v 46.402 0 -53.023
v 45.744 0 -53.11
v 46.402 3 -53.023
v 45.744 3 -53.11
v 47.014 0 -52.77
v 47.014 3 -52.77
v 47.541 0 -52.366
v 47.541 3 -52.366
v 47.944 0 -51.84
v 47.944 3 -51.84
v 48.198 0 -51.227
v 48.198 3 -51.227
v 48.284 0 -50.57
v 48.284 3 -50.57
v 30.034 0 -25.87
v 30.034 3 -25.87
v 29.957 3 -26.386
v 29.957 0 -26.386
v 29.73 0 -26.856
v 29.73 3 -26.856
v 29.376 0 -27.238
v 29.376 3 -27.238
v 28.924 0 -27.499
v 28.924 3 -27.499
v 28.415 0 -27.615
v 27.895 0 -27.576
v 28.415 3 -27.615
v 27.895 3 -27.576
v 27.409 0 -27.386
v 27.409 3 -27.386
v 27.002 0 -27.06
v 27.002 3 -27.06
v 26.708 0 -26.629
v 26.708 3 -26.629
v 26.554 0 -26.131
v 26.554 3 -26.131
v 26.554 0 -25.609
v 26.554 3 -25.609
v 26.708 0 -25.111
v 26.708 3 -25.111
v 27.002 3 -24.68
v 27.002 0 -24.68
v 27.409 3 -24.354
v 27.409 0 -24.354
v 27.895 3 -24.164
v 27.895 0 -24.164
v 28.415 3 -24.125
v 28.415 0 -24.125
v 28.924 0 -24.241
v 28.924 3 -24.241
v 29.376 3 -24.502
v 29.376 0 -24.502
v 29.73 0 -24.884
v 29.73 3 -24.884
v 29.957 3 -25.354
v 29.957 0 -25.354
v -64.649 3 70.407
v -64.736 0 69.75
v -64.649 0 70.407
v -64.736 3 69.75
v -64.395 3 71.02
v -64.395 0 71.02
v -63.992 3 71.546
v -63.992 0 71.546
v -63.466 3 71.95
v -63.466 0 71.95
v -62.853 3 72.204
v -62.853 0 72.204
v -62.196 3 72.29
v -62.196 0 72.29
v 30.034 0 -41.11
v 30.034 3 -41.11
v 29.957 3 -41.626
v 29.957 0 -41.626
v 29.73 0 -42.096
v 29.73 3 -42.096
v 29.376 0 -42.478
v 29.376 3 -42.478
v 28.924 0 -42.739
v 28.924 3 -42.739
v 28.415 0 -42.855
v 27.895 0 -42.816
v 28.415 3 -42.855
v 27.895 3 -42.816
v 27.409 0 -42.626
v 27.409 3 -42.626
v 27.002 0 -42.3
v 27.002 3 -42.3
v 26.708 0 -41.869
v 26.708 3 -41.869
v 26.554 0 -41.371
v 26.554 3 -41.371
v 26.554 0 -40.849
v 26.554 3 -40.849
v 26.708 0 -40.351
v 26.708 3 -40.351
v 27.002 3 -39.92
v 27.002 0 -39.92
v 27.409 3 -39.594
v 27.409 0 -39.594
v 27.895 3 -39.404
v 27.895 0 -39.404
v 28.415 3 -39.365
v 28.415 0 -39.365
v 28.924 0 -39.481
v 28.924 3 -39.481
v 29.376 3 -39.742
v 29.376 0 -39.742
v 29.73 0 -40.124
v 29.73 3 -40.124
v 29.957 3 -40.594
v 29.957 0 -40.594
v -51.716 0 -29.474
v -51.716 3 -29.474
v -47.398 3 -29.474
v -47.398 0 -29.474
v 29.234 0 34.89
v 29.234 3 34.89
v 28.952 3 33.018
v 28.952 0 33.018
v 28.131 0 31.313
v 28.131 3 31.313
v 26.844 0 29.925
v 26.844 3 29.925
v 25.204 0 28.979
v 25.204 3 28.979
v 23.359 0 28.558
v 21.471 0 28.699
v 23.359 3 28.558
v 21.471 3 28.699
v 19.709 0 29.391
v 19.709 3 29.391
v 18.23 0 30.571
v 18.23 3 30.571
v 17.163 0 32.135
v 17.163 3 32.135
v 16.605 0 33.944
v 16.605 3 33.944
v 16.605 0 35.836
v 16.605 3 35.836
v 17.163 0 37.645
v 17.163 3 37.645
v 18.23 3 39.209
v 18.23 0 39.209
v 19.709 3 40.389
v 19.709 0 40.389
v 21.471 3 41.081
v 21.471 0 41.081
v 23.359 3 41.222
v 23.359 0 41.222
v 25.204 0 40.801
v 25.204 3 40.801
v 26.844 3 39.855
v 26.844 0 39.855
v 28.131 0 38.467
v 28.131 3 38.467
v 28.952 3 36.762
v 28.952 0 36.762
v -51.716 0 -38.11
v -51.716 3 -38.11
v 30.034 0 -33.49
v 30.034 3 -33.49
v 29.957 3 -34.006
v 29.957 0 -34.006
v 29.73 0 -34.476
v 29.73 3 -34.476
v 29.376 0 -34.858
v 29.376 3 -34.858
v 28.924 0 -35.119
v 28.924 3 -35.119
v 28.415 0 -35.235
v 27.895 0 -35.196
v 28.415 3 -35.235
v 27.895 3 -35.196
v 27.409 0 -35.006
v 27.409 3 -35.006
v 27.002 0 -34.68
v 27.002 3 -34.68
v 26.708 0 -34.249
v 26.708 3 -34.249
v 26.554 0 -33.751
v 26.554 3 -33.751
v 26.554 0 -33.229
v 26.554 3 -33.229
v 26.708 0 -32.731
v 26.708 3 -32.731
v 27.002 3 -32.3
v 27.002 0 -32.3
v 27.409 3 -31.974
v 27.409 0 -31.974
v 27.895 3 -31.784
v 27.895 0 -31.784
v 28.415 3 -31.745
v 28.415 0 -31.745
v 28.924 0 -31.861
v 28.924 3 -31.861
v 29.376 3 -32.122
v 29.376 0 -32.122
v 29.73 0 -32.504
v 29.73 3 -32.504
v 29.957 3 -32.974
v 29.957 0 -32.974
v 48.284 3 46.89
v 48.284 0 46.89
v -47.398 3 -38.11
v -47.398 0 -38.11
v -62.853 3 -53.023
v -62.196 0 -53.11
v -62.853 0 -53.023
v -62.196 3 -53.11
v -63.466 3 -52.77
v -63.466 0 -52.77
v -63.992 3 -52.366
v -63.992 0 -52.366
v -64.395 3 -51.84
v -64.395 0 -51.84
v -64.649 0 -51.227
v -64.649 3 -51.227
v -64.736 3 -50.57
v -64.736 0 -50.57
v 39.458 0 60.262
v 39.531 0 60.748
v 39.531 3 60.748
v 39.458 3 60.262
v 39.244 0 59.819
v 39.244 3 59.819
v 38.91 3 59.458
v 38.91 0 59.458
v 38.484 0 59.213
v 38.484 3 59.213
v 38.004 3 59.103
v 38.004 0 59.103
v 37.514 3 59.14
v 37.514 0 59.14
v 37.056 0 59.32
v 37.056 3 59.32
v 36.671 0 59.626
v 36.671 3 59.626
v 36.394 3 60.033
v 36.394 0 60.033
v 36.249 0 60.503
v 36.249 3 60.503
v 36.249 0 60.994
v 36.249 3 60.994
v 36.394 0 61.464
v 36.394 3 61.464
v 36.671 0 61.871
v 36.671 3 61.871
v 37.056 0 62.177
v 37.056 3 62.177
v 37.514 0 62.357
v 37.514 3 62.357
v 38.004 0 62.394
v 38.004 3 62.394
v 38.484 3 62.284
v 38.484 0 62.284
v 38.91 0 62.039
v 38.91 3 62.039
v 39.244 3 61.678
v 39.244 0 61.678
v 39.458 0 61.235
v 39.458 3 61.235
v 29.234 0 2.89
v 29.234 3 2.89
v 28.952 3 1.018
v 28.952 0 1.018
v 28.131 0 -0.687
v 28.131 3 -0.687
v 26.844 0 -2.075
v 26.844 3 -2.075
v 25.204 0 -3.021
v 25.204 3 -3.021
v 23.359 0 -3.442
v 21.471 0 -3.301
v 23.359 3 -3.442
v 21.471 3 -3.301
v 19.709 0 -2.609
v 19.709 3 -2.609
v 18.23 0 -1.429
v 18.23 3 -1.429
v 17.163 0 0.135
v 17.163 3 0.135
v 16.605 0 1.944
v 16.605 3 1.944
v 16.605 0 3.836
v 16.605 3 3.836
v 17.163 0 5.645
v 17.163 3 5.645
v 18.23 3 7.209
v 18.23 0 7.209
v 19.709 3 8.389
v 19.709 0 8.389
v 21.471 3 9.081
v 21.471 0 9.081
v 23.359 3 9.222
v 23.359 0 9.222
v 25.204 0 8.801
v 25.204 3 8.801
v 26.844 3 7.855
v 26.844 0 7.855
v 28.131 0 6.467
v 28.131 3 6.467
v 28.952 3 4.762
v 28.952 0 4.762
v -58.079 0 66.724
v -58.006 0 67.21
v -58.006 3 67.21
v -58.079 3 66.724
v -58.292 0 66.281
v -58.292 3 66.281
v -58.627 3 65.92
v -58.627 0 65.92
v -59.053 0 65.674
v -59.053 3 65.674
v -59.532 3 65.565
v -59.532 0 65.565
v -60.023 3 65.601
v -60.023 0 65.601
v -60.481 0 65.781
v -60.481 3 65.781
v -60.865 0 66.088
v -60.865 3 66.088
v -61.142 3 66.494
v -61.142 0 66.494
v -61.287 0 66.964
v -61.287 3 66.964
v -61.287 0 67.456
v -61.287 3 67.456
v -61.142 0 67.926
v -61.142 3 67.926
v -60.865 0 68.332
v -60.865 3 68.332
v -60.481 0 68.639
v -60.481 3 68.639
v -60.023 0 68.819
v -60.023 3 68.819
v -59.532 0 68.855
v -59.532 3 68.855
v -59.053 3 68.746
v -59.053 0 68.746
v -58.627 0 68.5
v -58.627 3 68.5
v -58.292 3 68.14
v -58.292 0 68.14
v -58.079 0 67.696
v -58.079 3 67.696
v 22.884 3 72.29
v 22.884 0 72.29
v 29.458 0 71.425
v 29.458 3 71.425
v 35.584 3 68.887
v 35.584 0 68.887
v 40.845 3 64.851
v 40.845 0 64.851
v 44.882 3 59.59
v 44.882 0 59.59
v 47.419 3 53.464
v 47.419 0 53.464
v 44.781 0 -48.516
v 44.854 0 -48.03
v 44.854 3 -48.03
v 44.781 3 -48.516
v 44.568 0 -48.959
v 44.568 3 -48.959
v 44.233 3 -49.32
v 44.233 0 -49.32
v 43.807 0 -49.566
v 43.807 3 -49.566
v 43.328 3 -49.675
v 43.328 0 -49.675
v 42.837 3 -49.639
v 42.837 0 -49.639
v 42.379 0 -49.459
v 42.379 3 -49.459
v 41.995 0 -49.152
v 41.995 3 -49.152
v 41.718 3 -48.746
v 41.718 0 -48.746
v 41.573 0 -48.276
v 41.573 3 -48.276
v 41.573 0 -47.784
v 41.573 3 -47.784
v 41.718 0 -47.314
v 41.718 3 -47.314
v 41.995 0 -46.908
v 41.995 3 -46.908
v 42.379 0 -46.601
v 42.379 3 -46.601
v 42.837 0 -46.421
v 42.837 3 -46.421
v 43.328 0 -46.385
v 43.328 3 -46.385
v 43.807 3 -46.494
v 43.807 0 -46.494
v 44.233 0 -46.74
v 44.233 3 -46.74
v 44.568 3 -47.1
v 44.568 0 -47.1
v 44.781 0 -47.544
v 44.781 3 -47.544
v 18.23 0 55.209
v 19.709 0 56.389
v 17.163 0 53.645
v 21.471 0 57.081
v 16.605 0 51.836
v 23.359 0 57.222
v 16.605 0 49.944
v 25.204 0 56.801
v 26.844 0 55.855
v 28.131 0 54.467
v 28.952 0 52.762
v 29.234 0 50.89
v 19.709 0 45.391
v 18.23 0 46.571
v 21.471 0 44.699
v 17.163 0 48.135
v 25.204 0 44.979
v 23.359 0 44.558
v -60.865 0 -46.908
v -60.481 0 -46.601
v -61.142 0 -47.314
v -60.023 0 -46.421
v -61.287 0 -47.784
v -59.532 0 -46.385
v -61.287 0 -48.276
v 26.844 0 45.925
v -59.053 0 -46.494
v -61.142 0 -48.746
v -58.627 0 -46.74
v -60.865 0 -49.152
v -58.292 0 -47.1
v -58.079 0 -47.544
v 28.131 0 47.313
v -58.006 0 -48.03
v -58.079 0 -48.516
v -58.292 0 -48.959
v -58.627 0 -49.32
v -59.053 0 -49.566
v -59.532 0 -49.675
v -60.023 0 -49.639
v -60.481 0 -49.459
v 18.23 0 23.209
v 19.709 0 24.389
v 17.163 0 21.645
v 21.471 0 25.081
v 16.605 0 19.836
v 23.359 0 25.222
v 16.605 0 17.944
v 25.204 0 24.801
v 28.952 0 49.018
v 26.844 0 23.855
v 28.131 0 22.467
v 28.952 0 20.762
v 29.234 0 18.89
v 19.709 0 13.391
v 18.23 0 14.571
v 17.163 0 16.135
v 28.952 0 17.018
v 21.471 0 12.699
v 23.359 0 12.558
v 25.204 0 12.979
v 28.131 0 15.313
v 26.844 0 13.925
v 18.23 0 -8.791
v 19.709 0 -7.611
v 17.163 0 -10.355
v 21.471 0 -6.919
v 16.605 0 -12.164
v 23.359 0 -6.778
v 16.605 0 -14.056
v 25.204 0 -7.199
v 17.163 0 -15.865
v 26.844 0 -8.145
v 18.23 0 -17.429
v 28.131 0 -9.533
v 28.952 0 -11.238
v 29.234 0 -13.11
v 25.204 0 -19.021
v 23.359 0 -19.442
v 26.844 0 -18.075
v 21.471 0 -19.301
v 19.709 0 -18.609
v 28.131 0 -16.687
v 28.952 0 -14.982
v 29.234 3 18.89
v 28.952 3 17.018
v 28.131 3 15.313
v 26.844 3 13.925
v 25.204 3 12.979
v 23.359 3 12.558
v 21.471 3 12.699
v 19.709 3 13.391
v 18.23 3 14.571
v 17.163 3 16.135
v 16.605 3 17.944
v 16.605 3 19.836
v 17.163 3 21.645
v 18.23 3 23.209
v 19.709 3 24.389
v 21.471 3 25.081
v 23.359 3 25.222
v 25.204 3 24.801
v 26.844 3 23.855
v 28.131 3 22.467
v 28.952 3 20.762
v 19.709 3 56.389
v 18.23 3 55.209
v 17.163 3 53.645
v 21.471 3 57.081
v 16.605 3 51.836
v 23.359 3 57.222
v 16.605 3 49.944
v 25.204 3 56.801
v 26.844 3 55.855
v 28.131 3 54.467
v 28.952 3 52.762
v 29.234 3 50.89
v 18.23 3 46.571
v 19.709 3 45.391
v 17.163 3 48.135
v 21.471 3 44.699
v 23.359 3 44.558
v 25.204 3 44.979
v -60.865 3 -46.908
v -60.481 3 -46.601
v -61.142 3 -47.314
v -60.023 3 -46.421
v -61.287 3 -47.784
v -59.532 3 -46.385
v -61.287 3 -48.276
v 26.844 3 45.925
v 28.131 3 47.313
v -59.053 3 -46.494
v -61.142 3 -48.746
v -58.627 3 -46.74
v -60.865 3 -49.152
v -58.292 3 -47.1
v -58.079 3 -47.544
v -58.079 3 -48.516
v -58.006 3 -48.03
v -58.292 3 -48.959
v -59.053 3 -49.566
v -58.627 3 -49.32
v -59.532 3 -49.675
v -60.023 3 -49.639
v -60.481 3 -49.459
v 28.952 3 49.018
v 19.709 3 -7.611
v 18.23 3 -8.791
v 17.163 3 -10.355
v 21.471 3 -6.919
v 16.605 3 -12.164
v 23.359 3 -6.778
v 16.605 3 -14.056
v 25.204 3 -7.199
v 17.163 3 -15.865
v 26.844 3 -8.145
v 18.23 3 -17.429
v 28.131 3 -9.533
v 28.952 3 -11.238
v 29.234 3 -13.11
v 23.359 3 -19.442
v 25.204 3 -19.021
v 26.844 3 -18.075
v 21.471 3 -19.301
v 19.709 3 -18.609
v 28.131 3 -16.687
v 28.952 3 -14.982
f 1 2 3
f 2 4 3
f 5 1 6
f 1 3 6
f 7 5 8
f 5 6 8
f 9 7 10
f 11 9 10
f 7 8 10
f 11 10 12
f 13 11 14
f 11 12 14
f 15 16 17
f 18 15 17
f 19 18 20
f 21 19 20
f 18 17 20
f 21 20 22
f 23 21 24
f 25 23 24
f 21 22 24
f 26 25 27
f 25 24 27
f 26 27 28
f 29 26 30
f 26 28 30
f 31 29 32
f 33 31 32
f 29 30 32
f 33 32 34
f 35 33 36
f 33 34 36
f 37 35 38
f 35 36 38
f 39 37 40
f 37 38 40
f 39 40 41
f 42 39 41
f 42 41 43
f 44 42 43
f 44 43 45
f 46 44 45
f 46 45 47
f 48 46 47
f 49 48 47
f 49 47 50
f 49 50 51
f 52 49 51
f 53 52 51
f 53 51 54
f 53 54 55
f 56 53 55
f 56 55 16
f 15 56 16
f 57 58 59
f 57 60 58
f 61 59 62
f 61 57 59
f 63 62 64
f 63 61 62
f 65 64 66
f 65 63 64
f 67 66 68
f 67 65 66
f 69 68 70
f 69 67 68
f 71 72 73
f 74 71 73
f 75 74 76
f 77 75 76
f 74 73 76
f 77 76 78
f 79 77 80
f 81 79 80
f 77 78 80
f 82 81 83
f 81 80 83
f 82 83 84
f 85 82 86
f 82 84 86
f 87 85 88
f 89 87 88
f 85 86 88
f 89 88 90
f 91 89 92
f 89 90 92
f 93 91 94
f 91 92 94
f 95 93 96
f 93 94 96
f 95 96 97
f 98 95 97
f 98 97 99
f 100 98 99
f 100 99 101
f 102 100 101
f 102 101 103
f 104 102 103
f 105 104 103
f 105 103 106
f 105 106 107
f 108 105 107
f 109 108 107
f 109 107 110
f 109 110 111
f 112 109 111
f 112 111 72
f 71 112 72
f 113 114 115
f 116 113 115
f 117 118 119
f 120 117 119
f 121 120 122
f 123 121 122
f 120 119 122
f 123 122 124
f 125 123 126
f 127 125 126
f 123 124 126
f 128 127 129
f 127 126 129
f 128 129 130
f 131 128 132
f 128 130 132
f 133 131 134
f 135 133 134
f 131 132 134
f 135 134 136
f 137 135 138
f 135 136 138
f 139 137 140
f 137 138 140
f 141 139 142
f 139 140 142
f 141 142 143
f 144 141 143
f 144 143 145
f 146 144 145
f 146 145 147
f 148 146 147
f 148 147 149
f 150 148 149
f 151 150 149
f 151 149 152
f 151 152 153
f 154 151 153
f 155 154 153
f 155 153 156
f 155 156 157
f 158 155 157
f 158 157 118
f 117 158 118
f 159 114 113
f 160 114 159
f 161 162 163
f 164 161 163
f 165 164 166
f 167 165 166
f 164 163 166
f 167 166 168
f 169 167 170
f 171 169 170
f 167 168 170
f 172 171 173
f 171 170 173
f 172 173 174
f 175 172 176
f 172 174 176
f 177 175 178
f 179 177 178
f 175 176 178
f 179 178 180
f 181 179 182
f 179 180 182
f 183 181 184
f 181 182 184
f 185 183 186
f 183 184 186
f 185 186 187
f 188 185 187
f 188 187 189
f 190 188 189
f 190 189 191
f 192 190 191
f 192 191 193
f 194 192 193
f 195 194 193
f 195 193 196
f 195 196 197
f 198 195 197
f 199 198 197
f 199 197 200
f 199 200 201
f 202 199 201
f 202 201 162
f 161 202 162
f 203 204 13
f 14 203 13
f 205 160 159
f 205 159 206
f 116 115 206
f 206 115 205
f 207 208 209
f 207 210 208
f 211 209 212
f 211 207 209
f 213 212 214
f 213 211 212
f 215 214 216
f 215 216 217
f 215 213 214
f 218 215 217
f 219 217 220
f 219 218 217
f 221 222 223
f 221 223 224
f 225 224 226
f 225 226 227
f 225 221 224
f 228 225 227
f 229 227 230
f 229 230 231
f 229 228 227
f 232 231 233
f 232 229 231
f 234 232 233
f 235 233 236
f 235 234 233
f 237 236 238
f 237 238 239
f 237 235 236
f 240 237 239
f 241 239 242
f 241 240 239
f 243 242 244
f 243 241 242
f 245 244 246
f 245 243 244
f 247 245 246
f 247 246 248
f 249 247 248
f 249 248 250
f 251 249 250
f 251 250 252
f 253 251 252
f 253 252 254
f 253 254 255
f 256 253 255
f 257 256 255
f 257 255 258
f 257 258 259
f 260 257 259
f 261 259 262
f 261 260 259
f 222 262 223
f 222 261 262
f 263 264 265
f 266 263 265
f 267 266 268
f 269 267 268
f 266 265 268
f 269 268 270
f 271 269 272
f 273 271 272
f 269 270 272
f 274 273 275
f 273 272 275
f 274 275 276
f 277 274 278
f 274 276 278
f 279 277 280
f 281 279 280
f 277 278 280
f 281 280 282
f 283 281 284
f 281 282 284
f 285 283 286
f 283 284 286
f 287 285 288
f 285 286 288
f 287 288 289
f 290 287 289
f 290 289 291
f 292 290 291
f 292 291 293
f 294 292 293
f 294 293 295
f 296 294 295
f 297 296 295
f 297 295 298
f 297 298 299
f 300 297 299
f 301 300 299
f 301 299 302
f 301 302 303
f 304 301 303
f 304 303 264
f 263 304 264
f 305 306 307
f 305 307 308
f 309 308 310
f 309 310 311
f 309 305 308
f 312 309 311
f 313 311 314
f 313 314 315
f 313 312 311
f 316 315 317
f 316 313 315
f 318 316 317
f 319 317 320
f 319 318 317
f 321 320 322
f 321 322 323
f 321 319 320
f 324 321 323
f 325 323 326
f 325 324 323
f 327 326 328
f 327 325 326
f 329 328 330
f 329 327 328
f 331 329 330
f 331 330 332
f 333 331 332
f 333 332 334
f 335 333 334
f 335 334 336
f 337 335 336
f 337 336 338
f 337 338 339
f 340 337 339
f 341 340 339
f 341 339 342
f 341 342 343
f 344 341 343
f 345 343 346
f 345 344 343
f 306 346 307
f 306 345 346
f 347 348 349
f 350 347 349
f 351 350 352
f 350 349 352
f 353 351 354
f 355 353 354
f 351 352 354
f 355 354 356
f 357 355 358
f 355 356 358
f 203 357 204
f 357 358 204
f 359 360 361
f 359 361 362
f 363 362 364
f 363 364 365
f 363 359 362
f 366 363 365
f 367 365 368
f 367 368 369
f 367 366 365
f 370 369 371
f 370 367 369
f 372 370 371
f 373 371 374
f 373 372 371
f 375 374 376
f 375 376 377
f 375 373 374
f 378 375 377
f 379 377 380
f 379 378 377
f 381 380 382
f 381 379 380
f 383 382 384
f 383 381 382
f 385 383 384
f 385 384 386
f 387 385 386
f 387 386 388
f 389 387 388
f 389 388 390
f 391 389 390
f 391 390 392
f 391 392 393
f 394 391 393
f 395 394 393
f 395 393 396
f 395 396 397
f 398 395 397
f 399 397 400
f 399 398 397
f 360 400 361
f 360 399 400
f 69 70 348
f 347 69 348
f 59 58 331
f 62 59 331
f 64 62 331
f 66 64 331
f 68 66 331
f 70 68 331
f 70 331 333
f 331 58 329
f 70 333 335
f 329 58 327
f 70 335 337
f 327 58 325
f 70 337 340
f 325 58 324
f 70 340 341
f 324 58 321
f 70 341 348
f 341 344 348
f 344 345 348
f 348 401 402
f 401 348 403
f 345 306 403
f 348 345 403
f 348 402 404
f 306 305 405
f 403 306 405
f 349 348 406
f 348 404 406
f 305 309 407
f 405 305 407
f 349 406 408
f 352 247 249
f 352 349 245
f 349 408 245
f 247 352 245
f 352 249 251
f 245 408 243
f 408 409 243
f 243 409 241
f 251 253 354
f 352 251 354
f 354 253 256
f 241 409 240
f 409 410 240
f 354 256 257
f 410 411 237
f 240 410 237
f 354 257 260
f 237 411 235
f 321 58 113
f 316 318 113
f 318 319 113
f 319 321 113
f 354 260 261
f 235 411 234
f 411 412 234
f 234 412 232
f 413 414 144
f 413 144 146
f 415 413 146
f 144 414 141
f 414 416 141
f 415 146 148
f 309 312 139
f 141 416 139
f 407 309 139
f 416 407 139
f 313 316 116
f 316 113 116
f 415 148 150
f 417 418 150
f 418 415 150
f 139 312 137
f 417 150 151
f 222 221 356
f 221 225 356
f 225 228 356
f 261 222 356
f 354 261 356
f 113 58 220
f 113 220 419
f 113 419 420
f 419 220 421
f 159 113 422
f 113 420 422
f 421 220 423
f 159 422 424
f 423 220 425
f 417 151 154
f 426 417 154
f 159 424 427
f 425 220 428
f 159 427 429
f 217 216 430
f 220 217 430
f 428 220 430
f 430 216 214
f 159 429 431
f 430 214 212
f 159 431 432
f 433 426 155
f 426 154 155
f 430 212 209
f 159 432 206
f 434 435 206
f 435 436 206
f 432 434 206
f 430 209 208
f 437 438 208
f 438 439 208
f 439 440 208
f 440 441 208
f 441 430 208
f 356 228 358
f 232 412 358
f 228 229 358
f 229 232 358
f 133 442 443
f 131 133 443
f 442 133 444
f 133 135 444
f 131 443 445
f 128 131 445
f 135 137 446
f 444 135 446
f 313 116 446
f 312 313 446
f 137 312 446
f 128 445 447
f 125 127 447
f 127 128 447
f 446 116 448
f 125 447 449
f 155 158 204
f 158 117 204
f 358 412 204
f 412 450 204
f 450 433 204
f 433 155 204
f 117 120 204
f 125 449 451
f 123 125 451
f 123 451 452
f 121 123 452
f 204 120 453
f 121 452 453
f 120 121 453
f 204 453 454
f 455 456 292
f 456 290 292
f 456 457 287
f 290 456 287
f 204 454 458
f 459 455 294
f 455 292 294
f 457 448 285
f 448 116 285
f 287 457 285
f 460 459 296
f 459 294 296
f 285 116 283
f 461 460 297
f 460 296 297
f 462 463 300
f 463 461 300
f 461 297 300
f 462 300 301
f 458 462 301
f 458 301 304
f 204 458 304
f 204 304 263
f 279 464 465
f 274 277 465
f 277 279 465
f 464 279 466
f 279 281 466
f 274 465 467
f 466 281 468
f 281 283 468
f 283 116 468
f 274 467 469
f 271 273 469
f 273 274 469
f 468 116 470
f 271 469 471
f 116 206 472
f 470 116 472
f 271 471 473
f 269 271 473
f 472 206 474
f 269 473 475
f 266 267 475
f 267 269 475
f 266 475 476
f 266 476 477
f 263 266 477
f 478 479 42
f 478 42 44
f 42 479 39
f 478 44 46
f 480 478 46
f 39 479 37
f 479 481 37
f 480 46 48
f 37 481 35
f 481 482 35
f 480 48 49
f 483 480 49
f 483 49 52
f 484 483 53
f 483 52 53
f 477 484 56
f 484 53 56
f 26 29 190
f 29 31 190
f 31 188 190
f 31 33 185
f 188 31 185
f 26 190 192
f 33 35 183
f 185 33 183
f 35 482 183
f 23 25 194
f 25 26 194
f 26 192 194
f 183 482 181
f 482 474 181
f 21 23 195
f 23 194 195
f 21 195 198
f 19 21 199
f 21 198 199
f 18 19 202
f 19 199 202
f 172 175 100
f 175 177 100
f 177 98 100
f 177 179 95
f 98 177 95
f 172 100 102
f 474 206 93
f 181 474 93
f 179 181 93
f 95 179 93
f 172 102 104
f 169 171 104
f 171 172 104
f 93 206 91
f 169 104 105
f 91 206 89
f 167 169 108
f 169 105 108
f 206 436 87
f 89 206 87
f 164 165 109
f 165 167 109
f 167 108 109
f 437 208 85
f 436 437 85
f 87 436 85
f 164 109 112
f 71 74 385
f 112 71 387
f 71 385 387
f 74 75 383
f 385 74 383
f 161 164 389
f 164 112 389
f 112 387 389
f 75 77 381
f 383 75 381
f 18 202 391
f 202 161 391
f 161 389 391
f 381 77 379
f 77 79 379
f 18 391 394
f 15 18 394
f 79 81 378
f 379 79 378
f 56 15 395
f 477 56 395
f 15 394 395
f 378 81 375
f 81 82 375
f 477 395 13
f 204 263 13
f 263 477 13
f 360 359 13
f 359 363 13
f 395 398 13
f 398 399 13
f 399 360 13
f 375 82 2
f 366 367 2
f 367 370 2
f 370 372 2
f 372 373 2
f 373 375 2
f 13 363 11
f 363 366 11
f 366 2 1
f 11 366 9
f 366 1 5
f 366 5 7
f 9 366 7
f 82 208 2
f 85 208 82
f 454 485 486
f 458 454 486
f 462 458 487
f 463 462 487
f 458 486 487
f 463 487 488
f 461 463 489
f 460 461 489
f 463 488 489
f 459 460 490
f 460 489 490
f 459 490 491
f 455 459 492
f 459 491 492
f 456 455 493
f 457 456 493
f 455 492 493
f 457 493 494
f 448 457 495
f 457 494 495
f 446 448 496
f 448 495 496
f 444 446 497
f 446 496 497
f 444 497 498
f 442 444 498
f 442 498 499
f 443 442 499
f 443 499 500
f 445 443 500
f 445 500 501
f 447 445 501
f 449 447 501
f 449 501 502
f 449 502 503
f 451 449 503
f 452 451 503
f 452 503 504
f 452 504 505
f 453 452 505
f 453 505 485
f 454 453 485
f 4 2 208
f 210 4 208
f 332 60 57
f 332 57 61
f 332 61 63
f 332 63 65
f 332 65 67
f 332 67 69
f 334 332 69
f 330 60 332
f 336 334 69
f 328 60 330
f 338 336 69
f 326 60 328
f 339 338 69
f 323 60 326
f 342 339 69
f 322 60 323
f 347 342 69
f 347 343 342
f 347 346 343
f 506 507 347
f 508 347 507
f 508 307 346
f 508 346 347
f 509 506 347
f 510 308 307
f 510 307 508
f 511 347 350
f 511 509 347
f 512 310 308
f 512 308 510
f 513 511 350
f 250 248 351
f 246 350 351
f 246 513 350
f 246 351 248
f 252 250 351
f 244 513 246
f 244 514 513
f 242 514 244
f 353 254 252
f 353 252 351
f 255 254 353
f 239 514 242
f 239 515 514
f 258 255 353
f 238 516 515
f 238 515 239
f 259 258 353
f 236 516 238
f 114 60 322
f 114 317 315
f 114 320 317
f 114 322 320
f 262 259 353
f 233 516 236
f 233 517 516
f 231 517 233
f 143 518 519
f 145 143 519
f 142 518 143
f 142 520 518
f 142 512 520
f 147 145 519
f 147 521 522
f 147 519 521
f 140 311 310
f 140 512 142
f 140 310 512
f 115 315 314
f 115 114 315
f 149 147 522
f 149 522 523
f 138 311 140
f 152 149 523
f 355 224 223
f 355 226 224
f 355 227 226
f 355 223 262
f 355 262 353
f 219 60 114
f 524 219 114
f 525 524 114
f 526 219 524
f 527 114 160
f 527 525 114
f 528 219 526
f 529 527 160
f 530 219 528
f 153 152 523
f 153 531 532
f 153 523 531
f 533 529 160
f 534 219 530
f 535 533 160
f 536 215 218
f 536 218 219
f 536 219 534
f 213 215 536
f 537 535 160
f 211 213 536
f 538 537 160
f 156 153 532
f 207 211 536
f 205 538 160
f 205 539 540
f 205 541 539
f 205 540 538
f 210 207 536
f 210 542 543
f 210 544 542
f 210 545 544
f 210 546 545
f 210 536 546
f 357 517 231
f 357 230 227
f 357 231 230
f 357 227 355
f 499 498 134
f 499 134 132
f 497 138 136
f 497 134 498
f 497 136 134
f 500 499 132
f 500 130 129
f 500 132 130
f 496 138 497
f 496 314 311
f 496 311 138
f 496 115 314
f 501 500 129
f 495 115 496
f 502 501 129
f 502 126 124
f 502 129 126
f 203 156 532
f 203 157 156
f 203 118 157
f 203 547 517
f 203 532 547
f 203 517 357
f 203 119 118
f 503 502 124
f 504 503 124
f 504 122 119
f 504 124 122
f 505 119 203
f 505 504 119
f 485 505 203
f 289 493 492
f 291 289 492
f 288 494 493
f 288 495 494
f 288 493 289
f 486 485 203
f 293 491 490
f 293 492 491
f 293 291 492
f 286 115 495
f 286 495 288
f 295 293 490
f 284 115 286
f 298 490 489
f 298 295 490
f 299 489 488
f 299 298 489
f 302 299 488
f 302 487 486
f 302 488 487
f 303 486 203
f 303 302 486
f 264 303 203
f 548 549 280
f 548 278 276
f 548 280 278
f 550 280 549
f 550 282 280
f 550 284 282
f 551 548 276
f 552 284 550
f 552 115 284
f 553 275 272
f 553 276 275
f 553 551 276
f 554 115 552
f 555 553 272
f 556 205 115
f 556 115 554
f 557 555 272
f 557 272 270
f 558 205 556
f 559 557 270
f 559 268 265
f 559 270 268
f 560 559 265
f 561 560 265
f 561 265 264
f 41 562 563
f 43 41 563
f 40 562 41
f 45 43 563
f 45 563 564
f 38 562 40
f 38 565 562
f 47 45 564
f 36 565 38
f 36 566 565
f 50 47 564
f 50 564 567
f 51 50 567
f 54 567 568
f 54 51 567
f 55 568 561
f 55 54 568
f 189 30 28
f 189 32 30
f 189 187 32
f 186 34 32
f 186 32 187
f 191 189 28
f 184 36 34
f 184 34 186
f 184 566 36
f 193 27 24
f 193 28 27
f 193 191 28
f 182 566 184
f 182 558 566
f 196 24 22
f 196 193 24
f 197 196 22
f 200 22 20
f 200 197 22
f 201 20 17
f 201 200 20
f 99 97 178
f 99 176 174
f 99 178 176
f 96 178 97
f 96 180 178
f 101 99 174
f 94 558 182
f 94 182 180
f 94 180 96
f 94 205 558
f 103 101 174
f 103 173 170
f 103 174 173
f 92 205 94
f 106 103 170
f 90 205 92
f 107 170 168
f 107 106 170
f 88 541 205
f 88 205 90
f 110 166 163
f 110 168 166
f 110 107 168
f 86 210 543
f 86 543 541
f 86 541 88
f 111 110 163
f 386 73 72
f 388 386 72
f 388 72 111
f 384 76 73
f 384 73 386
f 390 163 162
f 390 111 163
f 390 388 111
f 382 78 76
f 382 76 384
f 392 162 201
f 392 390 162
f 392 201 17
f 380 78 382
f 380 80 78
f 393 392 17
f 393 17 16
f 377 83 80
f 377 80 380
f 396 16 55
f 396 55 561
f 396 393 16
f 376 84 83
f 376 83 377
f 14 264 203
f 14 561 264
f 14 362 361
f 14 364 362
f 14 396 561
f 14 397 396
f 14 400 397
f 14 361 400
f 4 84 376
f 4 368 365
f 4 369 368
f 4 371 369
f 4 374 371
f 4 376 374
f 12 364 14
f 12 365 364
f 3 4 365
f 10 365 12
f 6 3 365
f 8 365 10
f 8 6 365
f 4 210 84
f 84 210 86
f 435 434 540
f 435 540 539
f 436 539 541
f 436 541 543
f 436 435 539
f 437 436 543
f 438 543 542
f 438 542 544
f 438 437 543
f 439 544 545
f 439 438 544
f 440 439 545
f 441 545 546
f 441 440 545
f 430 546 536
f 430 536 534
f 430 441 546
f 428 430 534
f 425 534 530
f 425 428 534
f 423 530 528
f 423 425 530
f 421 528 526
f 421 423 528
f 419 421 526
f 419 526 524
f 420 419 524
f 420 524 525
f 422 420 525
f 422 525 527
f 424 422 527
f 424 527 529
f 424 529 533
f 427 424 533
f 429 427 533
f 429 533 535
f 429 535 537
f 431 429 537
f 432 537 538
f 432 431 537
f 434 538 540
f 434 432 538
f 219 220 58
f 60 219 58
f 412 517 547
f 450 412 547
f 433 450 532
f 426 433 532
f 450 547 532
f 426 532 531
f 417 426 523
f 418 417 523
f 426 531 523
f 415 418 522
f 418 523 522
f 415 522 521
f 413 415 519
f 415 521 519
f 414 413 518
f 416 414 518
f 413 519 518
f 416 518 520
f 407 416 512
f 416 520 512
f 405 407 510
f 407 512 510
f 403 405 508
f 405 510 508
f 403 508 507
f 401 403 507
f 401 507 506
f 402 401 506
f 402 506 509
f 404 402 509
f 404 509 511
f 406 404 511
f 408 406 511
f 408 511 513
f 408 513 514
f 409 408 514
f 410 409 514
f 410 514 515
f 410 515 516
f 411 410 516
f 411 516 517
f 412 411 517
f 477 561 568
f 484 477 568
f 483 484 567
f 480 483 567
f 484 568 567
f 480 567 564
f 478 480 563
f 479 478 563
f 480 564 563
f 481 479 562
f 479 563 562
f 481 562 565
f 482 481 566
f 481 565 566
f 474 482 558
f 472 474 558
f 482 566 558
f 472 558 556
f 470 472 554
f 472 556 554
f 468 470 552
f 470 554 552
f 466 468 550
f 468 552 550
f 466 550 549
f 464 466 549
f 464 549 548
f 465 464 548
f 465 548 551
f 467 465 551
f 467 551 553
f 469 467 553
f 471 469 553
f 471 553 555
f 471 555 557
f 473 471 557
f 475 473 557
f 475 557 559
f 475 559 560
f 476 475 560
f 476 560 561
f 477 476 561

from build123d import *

# Parameters (mm, degrees)
SKETCH1_R           = 1.65
BOSS_EXTRUDE3_DEPTH = 3
FILLET1_R           = 2.54
SKETCH6_R           = 6.35
BUTTONS_DEPTH       = 4
SKETCH7_R           = 1.75
CUT_EXTRUDE5_DEPTH  = 4
SKETCH8_W           = 4.318
SKETCH8_H           = 8.636
CUT_EXTRUDE6_DEPTH  = 4


with BuildPart() as part:
    # Sketch1 → Boss-Extrude3 (new body)
    with BuildSketch(Plane(origin=(0, 0, 0), x_dir=(1, 0, 0), z_dir=(0, 1, 0))):
        with BuildLine():
            Line((48.284490735, 53.109977813), (-64.735509285, 53.109977813))
            Line((-64.735509285, 53.109977813), (-64.735509285, -72.290076187))
            Line((-64.735509285, -72.290076187), (22.884490735, -72.290076187))
            ThreePointArc((22.884490735, -72.290076187), (40.845002977, -64.850588429), (48.284490735, -46.890076187))
            Line((48.284490735, -46.890076187), (48.284490735, 53.109977813))
        make_face()
        with Locations((-59.655509285, 48.029977813)):
            Circle(SKETCH1_R, mode=Mode.SUBTRACT)
        with Locations((43.204490735, 48.029977813)):
            Circle(SKETCH1_R, mode=Mode.SUBTRACT)
        with Locations((-59.655509285, -67.210076187)):
            Circle(SKETCH1_R, mode=Mode.SUBTRACT)
        with Locations((37.880892571, -60.748479124)):
            Circle(SKETCH1_R, mode=Mode.SUBTRACT)
    extrude(amount=BOSS_EXTRUDE3_DEPTH)

    # Fillet1
    fillet1_edges = [part.edges().sort_by_distance(p)[0] for p in [
        (-64.735509285, 1.5, 72.290076187),
        (-64.735509285, 1.5, -53.109977813),
        (48.284490735, 1.5, -53.109977813),
    ]]
    fillet(fillet1_edges, radius=FILLET1_R)

    # Sketch6 → Buttons (cut, through all)
    with BuildSketch(Plane(origin=(0, 3, 0), x_dir=(1, 0, 0), z_dir=(0, 1, 0))):
        with Locations((22.884490735, 13.109977813)):
            Circle(SKETCH6_R)
        with Locations((22.884490735, -2.890022187)):
            Circle(SKETCH6_R)
        with Locations((22.884490735, -18.890022187)):
            Circle(SKETCH6_R)
        with Locations((22.884490735, -34.890022187)):
            Circle(SKETCH6_R)
        with Locations((22.884490735, -50.890022187)):
            Circle(SKETCH6_R)
    extrude(amount=-BUTTONS_DEPTH, mode=Mode.SUBTRACT)

    # Sketch7 → Cut-Extrude5 (cut, through all)
    with BuildSketch(Plane(origin=(0, 3, 0), x_dir=(1, 0, 0), z_dir=(0, 1, 0))):
        with Locations((28.284490735, 41.109977813)):
            Circle(SKETCH7_R)
        with Locations((28.284490735, 33.489977813)):
            Circle(SKETCH7_R)
        with Locations((28.284490735, 25.869977813)):
            Circle(SKETCH7_R)
    extrude(amount=-CUT_EXTRUDE5_DEPTH, mode=Mode.SUBTRACT)

    # Sketch8 → Cut-Extrude6 (cut, through all)
    with BuildSketch(Plane(origin=(0, 3, 0), x_dir=(1, 0, 0), z_dir=(0, 1, 0))):
        with Locations((-49.556509265, 33.791977813)):
            Rectangle(SKETCH8_W, SKETCH8_H)
    extrude(amount=-CUT_EXTRUDE6_DEPTH, mode=Mode.SUBTRACT)


solid = part.part
